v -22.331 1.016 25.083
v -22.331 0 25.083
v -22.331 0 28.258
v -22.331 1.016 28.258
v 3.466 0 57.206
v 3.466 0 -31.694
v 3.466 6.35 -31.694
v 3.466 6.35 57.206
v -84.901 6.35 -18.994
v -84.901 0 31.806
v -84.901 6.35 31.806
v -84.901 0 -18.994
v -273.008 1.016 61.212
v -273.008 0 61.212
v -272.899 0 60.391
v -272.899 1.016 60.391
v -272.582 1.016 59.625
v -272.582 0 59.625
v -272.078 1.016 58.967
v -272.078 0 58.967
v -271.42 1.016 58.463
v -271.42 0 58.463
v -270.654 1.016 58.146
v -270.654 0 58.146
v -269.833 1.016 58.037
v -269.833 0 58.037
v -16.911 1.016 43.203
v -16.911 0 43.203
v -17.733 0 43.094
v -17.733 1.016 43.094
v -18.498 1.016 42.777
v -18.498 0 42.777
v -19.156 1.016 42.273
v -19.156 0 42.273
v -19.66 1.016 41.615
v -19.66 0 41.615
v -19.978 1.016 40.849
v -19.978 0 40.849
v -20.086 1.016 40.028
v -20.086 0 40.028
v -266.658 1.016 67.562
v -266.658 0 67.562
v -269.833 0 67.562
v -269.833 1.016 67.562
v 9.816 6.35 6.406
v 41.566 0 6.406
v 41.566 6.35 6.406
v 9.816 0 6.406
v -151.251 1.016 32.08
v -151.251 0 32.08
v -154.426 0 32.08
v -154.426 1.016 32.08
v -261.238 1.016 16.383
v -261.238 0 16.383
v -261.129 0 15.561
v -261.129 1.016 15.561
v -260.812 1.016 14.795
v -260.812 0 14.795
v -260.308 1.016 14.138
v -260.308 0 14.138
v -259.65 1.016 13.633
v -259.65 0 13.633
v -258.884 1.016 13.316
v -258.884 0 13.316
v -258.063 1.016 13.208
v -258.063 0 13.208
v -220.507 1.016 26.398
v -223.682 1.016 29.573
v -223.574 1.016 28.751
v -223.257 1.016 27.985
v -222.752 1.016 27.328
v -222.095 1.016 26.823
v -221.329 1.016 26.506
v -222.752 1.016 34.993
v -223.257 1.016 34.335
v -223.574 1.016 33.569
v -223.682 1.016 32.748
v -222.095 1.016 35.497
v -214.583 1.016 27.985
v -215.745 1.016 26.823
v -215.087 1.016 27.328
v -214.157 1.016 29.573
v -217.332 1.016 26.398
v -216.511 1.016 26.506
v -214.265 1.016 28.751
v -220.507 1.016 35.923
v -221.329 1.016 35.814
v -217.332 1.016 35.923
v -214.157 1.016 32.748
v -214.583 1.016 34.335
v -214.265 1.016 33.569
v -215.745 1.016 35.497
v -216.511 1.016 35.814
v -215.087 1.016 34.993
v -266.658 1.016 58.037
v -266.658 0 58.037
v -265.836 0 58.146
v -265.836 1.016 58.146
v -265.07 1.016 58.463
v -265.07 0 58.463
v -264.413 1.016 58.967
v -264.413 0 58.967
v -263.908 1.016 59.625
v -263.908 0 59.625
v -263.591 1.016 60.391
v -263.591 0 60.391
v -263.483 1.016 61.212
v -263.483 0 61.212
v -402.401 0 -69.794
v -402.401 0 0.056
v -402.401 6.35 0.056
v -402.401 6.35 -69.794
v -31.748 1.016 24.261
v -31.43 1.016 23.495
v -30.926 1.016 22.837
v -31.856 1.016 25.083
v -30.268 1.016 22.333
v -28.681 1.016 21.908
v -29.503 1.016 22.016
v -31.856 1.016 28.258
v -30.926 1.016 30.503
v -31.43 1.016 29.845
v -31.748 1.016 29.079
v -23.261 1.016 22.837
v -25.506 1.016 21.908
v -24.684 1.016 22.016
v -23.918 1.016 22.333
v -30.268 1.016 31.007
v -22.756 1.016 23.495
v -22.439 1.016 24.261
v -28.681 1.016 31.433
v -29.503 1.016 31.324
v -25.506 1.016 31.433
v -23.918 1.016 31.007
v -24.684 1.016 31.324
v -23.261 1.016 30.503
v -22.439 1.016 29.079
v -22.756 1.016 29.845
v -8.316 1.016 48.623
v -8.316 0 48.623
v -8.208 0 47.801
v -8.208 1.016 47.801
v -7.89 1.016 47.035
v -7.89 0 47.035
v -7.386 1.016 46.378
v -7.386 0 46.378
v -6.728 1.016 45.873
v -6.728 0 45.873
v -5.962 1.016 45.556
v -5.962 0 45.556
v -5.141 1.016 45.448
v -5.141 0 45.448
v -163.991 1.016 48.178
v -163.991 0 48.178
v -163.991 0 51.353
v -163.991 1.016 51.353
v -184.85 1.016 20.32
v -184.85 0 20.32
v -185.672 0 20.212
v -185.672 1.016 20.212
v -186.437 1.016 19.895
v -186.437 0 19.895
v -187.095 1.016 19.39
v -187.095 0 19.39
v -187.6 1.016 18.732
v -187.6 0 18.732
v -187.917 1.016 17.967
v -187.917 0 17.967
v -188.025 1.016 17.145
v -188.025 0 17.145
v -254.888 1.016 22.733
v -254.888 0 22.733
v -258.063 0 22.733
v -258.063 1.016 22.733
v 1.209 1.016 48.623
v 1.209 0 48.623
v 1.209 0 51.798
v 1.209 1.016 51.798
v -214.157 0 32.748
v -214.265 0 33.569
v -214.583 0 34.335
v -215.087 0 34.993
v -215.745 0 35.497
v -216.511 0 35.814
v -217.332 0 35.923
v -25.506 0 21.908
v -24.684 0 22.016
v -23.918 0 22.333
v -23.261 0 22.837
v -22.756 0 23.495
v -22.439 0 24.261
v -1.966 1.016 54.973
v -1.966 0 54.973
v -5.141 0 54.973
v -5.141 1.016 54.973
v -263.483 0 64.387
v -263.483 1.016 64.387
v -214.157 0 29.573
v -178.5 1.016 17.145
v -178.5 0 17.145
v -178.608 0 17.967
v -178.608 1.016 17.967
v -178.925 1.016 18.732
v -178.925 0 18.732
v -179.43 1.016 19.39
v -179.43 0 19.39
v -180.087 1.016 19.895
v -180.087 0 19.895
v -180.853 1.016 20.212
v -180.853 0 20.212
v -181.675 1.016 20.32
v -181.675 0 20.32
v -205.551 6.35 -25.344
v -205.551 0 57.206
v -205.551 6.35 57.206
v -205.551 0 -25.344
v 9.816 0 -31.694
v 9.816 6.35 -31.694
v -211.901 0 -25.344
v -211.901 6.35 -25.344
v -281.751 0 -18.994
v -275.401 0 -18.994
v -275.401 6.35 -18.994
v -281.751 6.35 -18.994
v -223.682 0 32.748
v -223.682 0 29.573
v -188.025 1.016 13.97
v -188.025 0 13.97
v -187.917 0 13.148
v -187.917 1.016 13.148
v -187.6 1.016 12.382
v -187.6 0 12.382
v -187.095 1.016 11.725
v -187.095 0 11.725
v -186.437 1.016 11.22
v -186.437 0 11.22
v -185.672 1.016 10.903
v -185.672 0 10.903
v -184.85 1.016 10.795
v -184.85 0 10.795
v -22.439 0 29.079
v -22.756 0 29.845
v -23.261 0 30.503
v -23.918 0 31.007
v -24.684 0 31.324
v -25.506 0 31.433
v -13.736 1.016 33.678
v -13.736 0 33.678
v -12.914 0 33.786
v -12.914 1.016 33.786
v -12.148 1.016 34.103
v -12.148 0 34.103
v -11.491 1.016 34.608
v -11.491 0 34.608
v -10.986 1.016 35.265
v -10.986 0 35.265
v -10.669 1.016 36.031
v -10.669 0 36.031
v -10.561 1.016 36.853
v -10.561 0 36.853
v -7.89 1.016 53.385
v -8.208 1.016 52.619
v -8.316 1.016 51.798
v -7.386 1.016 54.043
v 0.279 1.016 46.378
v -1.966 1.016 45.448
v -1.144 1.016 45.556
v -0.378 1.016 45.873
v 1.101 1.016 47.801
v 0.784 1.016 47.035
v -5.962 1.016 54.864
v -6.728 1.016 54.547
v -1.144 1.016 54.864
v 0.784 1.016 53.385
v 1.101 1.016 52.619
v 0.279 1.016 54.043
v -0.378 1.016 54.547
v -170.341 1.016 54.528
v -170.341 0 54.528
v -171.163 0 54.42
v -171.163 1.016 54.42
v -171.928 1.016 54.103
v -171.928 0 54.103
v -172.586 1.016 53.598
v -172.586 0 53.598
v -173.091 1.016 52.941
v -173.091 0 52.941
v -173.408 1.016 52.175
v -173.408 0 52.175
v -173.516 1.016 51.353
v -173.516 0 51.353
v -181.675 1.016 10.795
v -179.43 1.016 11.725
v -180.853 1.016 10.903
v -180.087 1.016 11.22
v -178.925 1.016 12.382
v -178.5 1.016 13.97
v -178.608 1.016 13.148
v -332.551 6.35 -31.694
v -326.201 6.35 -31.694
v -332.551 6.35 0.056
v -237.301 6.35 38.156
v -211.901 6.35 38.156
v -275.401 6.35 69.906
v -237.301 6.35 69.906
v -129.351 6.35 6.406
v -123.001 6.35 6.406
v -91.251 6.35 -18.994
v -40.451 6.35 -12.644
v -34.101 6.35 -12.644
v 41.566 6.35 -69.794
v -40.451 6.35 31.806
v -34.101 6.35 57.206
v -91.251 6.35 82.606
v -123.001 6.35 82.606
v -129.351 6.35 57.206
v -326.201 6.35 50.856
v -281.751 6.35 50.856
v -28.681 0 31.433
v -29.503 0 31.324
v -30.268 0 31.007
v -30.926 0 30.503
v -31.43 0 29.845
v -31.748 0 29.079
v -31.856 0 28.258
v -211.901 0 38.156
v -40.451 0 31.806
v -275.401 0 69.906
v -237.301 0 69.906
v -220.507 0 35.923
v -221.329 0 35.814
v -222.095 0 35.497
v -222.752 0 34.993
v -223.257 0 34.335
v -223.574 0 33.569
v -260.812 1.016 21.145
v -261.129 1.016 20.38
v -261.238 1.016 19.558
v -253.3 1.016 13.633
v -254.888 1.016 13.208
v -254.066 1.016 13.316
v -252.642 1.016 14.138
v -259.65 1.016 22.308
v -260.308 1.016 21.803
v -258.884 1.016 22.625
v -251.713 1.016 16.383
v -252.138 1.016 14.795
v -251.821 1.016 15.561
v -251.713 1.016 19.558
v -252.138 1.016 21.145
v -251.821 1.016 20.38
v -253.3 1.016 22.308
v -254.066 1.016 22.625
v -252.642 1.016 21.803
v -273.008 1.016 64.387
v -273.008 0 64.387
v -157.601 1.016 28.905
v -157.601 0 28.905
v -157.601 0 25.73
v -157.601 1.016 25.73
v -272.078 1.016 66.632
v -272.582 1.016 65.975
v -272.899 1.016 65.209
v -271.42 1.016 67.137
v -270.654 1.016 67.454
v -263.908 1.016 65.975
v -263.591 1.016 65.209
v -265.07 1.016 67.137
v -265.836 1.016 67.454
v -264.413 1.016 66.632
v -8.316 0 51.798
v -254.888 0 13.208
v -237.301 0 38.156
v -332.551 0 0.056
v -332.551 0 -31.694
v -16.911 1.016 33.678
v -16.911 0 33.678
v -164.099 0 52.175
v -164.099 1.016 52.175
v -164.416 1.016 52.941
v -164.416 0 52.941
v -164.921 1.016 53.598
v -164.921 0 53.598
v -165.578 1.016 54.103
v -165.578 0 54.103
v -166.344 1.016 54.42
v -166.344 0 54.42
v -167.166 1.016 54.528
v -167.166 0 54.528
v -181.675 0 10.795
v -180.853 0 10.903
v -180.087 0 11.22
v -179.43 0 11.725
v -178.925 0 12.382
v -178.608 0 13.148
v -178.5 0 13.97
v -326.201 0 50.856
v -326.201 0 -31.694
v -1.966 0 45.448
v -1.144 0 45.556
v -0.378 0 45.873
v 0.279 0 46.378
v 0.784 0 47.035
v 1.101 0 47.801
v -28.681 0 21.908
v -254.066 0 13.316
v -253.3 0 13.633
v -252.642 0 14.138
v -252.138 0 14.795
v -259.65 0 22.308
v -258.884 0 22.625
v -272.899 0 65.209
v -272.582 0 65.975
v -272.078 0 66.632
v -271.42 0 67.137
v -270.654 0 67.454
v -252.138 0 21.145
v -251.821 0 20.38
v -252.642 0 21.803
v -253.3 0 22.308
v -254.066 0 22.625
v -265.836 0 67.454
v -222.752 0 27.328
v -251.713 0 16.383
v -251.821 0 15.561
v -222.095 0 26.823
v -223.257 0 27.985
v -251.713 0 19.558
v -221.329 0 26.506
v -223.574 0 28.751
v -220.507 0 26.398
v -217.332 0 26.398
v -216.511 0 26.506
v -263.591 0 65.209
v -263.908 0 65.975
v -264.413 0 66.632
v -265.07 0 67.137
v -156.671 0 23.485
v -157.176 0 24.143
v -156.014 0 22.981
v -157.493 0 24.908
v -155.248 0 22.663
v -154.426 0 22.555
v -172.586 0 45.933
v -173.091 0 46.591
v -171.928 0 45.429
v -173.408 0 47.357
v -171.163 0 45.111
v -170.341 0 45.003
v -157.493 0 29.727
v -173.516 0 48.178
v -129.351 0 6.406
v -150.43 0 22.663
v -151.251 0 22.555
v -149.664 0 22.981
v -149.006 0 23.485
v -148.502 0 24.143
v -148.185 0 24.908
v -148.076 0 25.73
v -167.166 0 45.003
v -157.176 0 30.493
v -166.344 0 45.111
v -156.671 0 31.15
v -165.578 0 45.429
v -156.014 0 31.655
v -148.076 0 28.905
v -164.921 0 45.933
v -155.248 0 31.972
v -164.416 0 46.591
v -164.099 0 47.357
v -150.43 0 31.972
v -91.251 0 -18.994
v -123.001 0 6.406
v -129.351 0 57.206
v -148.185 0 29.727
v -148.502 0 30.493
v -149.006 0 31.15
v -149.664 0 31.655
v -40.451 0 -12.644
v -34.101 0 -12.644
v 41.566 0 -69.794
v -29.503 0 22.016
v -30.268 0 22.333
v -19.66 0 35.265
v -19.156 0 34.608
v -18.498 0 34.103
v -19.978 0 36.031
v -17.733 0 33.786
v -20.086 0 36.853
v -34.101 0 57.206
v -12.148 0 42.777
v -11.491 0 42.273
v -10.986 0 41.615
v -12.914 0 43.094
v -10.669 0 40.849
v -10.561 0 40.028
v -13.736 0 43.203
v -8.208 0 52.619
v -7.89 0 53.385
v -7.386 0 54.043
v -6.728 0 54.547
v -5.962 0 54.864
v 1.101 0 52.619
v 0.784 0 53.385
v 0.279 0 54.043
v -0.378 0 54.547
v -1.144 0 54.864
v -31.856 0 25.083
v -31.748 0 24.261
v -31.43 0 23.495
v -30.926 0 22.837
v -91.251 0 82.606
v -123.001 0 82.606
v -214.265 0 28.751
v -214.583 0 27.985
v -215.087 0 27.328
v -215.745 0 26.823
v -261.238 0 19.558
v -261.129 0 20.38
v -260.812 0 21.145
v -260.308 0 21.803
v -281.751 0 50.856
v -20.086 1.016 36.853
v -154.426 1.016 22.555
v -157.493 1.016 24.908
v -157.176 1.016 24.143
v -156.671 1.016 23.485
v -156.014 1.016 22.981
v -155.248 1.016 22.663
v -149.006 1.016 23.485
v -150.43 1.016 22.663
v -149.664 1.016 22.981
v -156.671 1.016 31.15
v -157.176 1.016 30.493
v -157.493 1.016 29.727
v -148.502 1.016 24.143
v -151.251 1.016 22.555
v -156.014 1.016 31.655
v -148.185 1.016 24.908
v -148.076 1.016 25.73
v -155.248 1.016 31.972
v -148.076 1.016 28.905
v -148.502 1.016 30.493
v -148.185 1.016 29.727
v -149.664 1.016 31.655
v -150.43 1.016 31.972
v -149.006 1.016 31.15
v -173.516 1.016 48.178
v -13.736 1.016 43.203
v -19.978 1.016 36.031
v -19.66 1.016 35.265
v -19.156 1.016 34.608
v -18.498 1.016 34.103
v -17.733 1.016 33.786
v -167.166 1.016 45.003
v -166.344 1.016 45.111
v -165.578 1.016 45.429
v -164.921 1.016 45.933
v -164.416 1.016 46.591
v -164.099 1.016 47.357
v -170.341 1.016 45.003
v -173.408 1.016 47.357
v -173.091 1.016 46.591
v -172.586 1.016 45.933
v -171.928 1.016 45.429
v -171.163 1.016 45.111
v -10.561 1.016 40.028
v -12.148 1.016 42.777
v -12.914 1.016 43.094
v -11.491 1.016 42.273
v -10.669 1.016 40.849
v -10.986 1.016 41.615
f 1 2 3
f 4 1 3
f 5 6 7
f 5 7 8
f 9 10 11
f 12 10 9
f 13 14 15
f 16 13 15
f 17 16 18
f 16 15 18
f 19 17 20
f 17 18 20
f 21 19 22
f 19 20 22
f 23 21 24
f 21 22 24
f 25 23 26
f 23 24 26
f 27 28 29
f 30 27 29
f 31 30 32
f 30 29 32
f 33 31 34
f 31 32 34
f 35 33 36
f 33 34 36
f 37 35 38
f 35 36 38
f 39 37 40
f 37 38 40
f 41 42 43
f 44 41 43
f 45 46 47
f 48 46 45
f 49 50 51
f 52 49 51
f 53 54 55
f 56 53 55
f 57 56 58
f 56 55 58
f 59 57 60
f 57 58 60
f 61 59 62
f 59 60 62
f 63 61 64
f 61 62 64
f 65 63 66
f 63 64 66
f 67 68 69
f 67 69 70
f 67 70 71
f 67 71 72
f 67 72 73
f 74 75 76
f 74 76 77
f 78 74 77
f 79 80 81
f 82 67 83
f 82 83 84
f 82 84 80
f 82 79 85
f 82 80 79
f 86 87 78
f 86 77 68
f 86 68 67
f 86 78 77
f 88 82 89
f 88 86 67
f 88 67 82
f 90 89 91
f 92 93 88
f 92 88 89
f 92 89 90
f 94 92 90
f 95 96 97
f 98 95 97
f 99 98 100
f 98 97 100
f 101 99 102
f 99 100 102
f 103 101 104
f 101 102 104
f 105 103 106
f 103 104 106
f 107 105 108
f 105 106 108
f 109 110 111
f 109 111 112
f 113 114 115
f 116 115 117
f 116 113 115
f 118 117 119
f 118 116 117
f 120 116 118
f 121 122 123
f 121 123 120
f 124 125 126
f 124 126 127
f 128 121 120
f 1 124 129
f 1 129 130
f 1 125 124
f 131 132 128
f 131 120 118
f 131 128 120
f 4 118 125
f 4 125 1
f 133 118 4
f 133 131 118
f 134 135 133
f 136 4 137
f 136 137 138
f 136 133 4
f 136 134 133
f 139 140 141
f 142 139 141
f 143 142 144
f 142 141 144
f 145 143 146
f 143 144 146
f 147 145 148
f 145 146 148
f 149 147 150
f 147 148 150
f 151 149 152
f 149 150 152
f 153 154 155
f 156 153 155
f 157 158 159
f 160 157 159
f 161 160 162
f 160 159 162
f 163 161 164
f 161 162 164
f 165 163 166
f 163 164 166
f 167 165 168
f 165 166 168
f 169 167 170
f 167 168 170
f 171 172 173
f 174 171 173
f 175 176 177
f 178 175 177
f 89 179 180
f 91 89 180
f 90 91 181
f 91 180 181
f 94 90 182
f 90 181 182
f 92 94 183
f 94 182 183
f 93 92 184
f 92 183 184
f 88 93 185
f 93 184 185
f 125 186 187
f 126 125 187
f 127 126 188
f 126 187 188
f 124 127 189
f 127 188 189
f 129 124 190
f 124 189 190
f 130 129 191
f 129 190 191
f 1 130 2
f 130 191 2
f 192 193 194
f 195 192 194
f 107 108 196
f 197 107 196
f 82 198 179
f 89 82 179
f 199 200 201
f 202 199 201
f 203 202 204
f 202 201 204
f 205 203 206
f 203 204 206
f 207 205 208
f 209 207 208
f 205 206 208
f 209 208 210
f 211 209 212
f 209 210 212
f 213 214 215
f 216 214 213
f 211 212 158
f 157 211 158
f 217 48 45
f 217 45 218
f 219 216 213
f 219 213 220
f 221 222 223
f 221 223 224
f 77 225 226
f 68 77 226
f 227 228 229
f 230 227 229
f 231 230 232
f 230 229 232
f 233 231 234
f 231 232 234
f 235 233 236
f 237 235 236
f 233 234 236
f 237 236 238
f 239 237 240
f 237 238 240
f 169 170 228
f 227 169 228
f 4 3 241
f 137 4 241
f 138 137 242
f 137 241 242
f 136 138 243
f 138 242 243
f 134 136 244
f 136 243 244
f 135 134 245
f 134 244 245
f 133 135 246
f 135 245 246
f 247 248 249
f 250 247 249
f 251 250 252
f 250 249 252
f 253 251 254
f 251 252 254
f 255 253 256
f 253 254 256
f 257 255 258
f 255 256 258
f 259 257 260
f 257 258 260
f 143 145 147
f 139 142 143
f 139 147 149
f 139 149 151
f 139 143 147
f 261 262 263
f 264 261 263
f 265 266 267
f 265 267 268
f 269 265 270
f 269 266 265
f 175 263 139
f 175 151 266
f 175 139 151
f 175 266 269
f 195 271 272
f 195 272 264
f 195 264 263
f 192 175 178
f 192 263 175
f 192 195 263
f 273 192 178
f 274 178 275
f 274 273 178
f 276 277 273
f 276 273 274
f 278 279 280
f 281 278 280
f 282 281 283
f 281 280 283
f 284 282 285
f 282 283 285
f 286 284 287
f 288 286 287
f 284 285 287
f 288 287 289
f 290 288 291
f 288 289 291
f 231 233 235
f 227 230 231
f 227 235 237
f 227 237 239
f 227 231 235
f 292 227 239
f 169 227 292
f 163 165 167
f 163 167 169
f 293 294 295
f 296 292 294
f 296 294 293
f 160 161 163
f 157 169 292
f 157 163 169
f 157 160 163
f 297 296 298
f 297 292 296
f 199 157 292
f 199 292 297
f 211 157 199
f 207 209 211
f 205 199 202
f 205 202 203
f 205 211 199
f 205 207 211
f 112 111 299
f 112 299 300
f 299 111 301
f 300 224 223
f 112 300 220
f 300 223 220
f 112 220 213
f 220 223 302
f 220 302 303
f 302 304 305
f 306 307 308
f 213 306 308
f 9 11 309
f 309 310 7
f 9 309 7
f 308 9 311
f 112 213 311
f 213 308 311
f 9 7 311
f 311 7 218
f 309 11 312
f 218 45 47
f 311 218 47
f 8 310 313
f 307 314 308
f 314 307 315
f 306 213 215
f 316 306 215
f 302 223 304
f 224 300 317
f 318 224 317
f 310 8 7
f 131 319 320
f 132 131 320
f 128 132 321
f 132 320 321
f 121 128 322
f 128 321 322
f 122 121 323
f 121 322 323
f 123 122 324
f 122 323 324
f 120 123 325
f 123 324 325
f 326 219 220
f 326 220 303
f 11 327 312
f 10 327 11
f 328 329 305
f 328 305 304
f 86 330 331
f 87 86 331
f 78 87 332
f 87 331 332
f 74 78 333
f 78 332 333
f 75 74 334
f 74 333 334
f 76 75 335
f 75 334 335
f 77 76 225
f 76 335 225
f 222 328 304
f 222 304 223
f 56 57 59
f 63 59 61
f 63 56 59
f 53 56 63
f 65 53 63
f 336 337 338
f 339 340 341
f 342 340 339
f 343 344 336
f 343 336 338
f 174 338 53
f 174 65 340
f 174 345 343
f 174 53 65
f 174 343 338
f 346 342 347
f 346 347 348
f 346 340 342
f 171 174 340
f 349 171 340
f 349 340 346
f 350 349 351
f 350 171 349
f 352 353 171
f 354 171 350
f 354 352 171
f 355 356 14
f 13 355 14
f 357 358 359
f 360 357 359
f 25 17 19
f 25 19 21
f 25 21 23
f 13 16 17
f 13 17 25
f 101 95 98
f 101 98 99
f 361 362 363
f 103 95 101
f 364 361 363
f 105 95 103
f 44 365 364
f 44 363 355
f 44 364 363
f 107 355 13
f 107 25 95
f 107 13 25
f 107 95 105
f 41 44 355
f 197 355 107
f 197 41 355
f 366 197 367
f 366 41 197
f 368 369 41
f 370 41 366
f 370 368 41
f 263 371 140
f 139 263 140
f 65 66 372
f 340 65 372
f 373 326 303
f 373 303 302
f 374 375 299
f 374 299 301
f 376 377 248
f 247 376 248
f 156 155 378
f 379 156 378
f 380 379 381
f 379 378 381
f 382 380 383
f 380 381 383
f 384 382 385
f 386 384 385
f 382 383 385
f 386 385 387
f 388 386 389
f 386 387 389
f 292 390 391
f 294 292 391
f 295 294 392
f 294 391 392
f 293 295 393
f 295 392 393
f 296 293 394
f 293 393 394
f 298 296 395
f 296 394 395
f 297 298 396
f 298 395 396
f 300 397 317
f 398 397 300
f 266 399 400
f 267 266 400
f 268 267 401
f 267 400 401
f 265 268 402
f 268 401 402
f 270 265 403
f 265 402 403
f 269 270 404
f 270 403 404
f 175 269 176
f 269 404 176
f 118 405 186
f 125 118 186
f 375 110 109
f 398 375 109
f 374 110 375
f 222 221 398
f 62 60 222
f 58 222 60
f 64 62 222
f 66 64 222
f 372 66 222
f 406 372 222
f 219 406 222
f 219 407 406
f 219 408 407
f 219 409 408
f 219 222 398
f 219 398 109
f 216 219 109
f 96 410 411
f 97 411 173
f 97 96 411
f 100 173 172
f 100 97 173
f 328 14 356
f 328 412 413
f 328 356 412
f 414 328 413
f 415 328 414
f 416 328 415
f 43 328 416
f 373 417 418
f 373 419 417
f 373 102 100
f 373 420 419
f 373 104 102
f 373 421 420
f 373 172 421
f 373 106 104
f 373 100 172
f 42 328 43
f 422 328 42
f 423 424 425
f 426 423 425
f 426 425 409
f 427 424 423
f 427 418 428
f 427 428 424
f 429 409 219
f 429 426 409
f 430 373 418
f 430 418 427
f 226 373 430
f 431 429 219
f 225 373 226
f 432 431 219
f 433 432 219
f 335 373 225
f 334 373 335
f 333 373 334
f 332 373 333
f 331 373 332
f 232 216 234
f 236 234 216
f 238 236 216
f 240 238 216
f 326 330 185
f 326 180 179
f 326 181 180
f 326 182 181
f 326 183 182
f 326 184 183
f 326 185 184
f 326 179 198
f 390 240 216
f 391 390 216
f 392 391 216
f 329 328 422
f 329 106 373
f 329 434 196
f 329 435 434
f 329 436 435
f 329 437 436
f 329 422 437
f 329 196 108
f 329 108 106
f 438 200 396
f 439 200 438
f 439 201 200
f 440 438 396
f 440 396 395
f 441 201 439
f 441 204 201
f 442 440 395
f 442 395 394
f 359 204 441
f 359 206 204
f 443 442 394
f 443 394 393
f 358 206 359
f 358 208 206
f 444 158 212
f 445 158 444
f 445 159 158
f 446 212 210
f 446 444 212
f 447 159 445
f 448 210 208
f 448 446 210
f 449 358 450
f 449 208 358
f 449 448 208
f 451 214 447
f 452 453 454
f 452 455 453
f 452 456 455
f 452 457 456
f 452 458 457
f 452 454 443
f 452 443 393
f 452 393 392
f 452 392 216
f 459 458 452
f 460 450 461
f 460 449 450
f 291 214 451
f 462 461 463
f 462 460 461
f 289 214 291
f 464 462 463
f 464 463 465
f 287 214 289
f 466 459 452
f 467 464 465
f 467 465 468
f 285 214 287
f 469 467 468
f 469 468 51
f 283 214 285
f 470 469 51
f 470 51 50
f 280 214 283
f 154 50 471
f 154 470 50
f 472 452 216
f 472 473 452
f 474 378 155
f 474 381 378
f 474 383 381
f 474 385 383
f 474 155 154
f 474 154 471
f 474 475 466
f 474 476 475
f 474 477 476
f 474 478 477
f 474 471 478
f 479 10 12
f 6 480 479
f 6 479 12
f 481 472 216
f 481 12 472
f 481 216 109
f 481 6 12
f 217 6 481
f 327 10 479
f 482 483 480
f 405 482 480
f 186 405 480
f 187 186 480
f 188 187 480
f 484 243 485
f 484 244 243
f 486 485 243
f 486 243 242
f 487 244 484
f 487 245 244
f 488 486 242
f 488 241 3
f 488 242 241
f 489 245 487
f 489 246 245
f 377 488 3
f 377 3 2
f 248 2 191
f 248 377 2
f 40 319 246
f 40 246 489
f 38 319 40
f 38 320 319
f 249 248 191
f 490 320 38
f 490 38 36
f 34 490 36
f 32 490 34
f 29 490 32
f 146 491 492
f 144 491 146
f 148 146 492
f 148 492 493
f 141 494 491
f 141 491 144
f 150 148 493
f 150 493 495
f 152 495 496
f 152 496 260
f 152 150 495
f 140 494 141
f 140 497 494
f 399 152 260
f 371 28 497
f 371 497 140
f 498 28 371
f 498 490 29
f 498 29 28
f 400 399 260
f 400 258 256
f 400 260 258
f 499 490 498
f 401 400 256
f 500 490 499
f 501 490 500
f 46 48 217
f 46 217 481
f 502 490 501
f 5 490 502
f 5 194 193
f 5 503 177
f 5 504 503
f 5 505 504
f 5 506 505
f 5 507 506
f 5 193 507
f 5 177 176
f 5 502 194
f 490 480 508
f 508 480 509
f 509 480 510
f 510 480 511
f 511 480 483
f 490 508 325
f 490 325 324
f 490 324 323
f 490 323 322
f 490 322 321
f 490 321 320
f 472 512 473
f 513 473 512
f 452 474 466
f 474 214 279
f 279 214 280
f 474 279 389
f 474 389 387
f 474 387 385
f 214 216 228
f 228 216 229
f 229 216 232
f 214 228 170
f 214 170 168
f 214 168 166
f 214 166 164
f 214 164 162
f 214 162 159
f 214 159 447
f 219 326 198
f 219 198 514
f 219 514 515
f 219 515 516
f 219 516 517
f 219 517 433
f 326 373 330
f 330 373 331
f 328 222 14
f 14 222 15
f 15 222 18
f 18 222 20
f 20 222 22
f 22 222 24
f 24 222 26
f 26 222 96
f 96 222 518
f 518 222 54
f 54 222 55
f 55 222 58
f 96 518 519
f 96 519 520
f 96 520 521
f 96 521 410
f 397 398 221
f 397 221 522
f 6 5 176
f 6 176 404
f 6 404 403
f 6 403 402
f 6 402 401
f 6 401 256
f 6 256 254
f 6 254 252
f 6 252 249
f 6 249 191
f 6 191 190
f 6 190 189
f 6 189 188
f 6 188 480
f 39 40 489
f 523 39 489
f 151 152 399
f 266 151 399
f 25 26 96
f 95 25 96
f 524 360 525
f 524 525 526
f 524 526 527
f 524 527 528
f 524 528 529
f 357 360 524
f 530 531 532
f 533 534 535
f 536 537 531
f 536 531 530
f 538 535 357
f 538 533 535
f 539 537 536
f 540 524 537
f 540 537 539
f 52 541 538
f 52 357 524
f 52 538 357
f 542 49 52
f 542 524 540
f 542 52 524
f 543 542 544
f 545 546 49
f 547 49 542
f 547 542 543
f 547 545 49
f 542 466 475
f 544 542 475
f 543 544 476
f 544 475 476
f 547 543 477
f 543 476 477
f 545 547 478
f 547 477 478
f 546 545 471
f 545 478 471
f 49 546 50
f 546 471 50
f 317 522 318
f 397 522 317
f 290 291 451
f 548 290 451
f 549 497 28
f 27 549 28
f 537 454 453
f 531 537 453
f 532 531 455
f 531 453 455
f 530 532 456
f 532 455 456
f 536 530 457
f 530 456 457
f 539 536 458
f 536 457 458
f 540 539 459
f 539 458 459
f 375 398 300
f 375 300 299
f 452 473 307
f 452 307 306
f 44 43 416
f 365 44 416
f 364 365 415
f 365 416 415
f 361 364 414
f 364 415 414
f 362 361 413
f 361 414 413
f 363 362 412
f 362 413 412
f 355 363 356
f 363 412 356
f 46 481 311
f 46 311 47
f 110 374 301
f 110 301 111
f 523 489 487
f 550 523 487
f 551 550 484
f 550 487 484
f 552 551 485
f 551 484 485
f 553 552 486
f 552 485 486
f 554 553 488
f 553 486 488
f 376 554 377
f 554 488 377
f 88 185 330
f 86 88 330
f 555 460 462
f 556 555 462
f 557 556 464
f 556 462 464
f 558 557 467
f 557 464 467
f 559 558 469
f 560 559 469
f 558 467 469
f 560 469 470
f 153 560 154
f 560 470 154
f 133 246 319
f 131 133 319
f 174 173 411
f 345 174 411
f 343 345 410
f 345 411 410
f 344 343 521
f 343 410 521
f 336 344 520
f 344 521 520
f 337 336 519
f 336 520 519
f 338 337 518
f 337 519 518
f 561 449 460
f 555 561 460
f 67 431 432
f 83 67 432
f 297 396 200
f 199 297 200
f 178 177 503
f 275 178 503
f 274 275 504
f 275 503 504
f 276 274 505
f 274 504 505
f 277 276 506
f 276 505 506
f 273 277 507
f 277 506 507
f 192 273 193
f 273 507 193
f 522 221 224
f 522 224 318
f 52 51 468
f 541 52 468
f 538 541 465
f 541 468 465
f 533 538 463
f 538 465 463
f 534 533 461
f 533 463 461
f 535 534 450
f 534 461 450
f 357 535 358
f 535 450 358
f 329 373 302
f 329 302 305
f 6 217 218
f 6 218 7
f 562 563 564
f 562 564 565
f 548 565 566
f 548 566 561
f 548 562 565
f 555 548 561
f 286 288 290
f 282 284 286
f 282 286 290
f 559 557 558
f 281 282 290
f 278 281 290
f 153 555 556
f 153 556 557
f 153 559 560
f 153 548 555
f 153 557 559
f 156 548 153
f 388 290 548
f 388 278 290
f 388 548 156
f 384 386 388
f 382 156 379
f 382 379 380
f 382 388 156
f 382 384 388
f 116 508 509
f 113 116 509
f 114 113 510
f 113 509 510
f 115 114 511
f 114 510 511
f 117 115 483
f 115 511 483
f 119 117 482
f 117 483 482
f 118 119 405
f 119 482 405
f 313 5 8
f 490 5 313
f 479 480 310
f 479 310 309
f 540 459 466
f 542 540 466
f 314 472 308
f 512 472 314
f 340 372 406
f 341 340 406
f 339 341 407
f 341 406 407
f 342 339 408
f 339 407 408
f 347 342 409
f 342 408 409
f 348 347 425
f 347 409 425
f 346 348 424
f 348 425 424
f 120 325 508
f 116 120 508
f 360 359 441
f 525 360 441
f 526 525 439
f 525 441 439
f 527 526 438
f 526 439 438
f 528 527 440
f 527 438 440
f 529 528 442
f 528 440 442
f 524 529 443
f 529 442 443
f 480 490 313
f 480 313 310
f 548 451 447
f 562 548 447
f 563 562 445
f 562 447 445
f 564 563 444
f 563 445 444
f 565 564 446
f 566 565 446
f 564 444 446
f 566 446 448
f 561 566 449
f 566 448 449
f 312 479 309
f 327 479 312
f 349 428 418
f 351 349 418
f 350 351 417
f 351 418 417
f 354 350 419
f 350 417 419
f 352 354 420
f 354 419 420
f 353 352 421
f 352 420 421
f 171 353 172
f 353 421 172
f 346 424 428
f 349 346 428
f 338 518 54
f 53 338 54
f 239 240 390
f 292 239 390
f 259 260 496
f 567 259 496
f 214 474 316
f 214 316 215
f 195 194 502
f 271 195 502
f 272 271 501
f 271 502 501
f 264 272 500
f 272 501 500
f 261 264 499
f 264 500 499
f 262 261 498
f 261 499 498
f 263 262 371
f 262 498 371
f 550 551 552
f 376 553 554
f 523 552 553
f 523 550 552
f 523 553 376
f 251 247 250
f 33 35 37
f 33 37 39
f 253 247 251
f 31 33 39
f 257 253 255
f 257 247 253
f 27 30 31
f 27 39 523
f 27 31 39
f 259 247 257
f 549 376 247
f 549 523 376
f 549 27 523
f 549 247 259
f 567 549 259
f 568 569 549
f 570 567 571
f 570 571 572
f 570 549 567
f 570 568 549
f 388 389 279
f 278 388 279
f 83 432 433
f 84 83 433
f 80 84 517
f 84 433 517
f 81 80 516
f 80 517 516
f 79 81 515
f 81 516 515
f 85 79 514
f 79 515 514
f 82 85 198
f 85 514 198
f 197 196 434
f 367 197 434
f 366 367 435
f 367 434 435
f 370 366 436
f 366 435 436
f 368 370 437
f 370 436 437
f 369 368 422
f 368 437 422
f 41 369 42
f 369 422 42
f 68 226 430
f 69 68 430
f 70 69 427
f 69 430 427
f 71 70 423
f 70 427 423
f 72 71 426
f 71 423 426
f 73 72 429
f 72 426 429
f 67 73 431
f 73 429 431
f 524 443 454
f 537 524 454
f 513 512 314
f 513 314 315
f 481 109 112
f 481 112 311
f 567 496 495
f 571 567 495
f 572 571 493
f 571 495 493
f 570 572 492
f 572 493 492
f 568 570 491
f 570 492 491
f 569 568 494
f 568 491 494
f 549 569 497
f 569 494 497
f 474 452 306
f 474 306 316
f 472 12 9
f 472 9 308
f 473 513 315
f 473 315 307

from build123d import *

# Parameters (mm, degrees)
F1_DEPTH = 6.35
F2_DEPTH = 1.016


with BuildPart() as f1:
    # F0 (on Front) → F1 (new body)
    with BuildSketch(Plane.XZ):
        Polygon((3.4657023708, 19.6624366212), (3.4657023708, 57.2062912531), (-34.1008976292, 57.2062912531), (-34.1008976292, 19.6624366212), (-34.1008976292, -12.6437214131), (-40.4508976292, -12.6437214131), (-40.4508976292, 31.8062785869), (-84.9008976292, 31.8062785869), (-84.9008976292, 17.7545957267), (-84.9008976292, -18.9937214131), (-91.2508976292, -18.9937214131), (-91.2508976292, 82.6062785869), (-123.0008976292, 82.6062785869), (-123.0008976292, 6.4062785869), (-129.3508976292, 6.4062785869), (-129.3508976292, 57.2062785869), (-205.5508976292, 57.2062785869), (-205.5508976292, -25.3437214131), (-211.9008976292, -25.3437214131), (-211.9008976292, 38.1562785869), (-237.3008976292, 38.1562785869), (-237.3008976292, 69.9062785869), (-275.4008976292, 69.9062785869), (-275.4008976292, -18.9937214131), (-281.7508976292, -18.9937214131), (-281.7508976292, 50.8562785869), (-326.2008976292, 50.8562785869), (-326.2008976292, -31.6937214131), (-332.5508976292, -31.6937214131), (-332.5508976292, 0.0562785869), (-402.4008976292, 0.0562785869), (-402.4008976292, -69.7937214131), (-332.5508976292, -69.7937214131), (-326.2008976292, -69.7937214131), (-281.7508976292, -69.7937214131), (-275.4008976292, -69.7937214131), (-237.3008976292, -69.7937214131), (-211.9008976292, -69.7937214131), (-205.5508976292, -69.7937214131), (-129.3508976292, -69.7937214131), (-123.0008976292, -69.7937214131), (-91.2508976292, -69.7937214131), (-84.9008976292, -69.7937214131), (-40.4508976292, -69.7937214131), (-34.1008976292, -69.7937214131), (3.4657023708, -69.7937214131), (9.8157023708, -69.7937214131), (41.5657023708, -69.7937214131), (41.5657023708, 6.4062785869), (9.8157023708, 6.4062785869), (9.8157023708, -31.6937214131), (3.4657023708, -31.6937214131), (3.4657023708, 19.651035132), align=None)
        with BuildLine():
            ThreePointArc((-258.0625617027, 13.2079981267), (-260.307625733, 14.1379340965), (-261.2375617027, 16.3829981267))
            Line((-261.2375617027, 16.3829981267), (-261.2375617027, 19.5579981267))
            ThreePointArc((-261.2375617027, 19.5579981267), (-260.307625733, 21.803062157), (-258.0625617027, 22.7329981267))
            Line((-258.0625617027, 22.7329981267), (-254.8875617027, 22.7329981267))
            ThreePointArc((-254.8875617027, 22.7329981267), (-252.6424976725, 21.803062157), (-251.7125617027, 19.5579981267))
            Line((-251.7125617027, 19.5579981267), (-251.7125617027, 16.3829981267))
            ThreePointArc((-251.7125617027, 16.3829981267), (-252.6424976725, 14.1379340965), (-254.8875617027, 13.2079981267))
            Line((-254.8875617027, 13.2079981267), (-258.0625617027, 13.2079981267))
        make_face(mode=Mode.SUBTRACT)
        with BuildLine():
            ThreePointArc((-188.0249530077, 17.1449978754), (-187.095017038, 19.3900619057), (-184.8499530077, 20.3199978754))
            Line((-184.8499530077, 20.3199978754), (-181.6749530077, 20.3199978754))
            ThreePointArc((-181.6749530077, 20.3199978754), (-179.4298889774, 19.3900619057), (-178.4999530077, 17.1449978754))
            Line((-178.4999530077, 17.1449978754), (-178.4999530077, 13.9699978754))
            ThreePointArc((-178.4999530077, 13.9699978754), (-179.4298889774, 11.7249338451), (-181.6749530077, 10.7949978754))
            Line((-181.6749530077, 10.7949978754), (-184.8499530077, 10.7949978754))
            ThreePointArc((-184.8499530077, 10.7949978754), (-187.095017038, 11.7249338451), (-188.0249530077, 13.9699978754))
            Line((-188.0249530077, 13.9699978754), (-188.0249530077, 17.1449978754))
        make_face(mode=Mode.SUBTRACT)
        with BuildLine():
            ThreePointArc((-223.6823077685, 32.7475722294), (-222.7523717988, 34.9926362596), (-220.5073077685, 35.9225722294))
            Line((-220.5073077685, 35.9225722294), (-217.3323077685, 35.9225722294))
            ThreePointArc((-217.3323077685, 35.9225722294), (-215.0872437382, 34.9926362596), (-214.1573077685, 32.7475722294))
            Line((-214.1573077685, 32.7475722294), (-214.1573077685, 29.5725722294))
            ThreePointArc((-214.1573077685, 29.5725722294), (-215.0872437382, 27.3275081991), (-217.3323077685, 26.3975722294))
            Line((-217.3323077685, 26.3975722294), (-220.5073077685, 26.3975722294))
            ThreePointArc((-220.5073077685, 26.3975722294), (-222.7523717988, 27.3275081991), (-223.6823077685, 29.5725722294))
            Line((-223.6823077685, 29.5725722294), (-223.6823077685, 32.7475722294))
        make_face(mode=Mode.SUBTRACT)
        with BuildLine():
            ThreePointArc((-269.8326279198, 58.0373540644), (-272.0776919501, 58.9672900342), (-273.0076279198, 61.2123540644))
            Line((-273.0076279198, 61.2123540644), (-273.0076279198, 64.3873540644))
            ThreePointArc((-273.0076279198, 64.3873540644), (-272.0776919501, 66.6324180947), (-269.8326279198, 67.5623540644))
            Line((-269.8326279198, 67.5623540644), (-266.6576279198, 67.5623540644))
            ThreePointArc((-266.6576279198, 67.5623540644), (-264.4125638896, 66.6324180947), (-263.4826279198, 64.3873540644))
            Line((-263.4826279198, 64.3873540644), (-263.4826279198, 61.2123540644))
            ThreePointArc((-263.4826279198, 61.2123540644), (-264.4125638896, 58.9672900342), (-266.6576279198, 58.0373540644))
            Line((-266.6576279198, 58.0373540644), (-269.8326279198, 58.0373540644))
        make_face(mode=Mode.SUBTRACT)
        with BuildLine():
            Line((-148.0764249472, 20.3199978754), (-181.6749530077, 20.3199978754))
            Line((-181.6749530077, 20.3199978754), (-181.6749530077, 22.5551978754))
            Line((-181.6749530077, 22.5551978754), (-154.4264242679, 22.5551978754))
            ThreePointArc((-154.4264242679, 22.5551978754), (-156.6714882982, 23.4851338451), (-157.6014242679, 25.7301978754))
            Line((-157.6014242679, 25.7301978754), (-157.6014242679, 28.9051978754))
            ThreePointArc((-157.6014242679, 28.9051978754), (-156.6714882982, 31.1502619057), (-154.4264242679, 32.0801978754))
            Line((-154.4264242679, 32.0801978754), (-151.2514242679, 32.0801978754))
            ThreePointArc((-151.2514242679, 32.0801978754), (-149.0063602376, 31.1502619057), (-148.0764242679, 28.9051978754))
            Line((-148.0764242679, 28.9051978754), (-148.0764242679, 25.7301978754))
            ThreePointArc((-148.0764242679, 25.7301978754), (-149.0063602376, 23.4851338451), (-151.2514242679, 22.5551978754))
            Line((-151.2514242679, 22.5551978754), (-148.0764249472, 22.5551978754))
            Line((-148.0764249472, 22.5551978754), (-148.0764249472, 20.3199978754))
        make_face(mode=Mode.SUBTRACT)
        with BuildLine():
            ThreePointArc((-31.855833599, 28.2575006515), (-30.9258976292, 30.5025646817), (-28.680833599, 31.4325006515))
            Line((-28.680833599, 31.4325006515), (-25.505833599, 31.4325006515))
            ThreePointArc((-25.505833599, 31.4325006515), (-23.2607695687, 30.5025646817), (-22.330833599, 28.2575006515))
            Line((-22.330833599, 28.2575006515), (-22.330833599, 25.0825006515))
            ThreePointArc((-22.330833599, 25.0825006515), (-23.2607695687, 22.8374366212), (-25.505833599, 21.9075006515))
            Line((-25.505833599, 21.9075006515), (-28.680833599, 21.9075006515))
            ThreePointArc((-28.680833599, 21.9075006515), (-30.9258976292, 22.8374366212), (-31.855833599, 25.0825006515))
            Line((-31.855833599, 25.0825006515), (-31.855833599, 28.2575006515))
        make_face(mode=Mode.SUBTRACT)
        with BuildLine():
            ThreePointArc((-20.0857695687, 40.0275646817), (-19.155833599, 42.272628712), (-16.9107695687, 43.2025646817))
            Line((-16.9107695687, 43.2025646817), (-13.7357695687, 43.2025646817))
            ThreePointArc((-13.7357695687, 43.2025646817), (-11.4907055384, 42.272628712), (-10.5607695687, 40.0275646817))
            Line((-10.5607695687, 40.0275646817), (-10.5607695687, 36.8525646817))
            ThreePointArc((-10.5607695687, 36.8525646817), (-11.4907055384, 34.6075006515), (-13.7357695687, 33.6775646817))
            Line((-13.7357695687, 33.6775646817), (-16.9107695687, 33.6775646817))
            ThreePointArc((-16.9107695687, 33.6775646817), (-19.155833599, 34.6075006515), (-20.0857695687, 36.8525646817))
            Line((-20.0857695687, 36.8525646817), (-20.0857695687, 40.0275646817))
        make_face(mode=Mode.SUBTRACT)
        with BuildLine():
            ThreePointArc((-173.5159547505, 51.3532994753), (-172.5860187808, 53.5983635056), (-170.3409547505, 54.5282994753))
            Line((-170.3409547505, 54.5282994753), (-167.1659547505, 54.5282994753))
            ThreePointArc((-167.1659547505, 54.5282994753), (-164.9208907202, 53.5983635056), (-163.9909547505, 51.3532994753))
            Line((-163.9909547505, 51.3532994753), (-163.9909547505, 48.1782994753))
            ThreePointArc((-163.9909547505, 48.1782994753), (-164.9208907202, 45.933235445), (-167.1659547505, 45.0032994753))
            Line((-167.1659547505, 45.0032994753), (-170.3409547505, 45.0032994753))
            ThreePointArc((-170.3409547505, 45.0032994753), (-172.5860187808, 45.933235445), (-173.5159547505, 48.1782994753))
            Line((-173.5159547505, 48.1782994753), (-173.5159547505, 51.3532994753))
        make_face(mode=Mode.SUBTRACT)
        with BuildLine():
            ThreePointArc((-8.3157055384, 51.797628712), (-7.3857695687, 54.0426927423), (-5.1407055384, 54.972628712))
            Line((-5.1407055384, 54.972628712), (-1.9657055384, 54.972628712))
            ThreePointArc((-1.9657055384, 54.972628712), (0.2793584918, 54.0426927423), (1.2092944616, 51.797628712))
            Line((1.2092944616, 51.797628712), (1.2092944616, 48.622628712))
            ThreePointArc((1.2092944616, 48.622628712), (0.2793584918, 46.3775646817), (-1.9657055384, 45.447628712))
            Line((-1.9657055384, 45.447628712), (-5.1407055384, 45.447628712))
            ThreePointArc((-5.1407055384, 45.447628712), (-7.3857695687, 46.3775646817), (-8.3157055384, 48.622628712))
            Line((-8.3157055384, 48.622628712), (-8.3157055384, 51.797628712))
        make_face(mode=Mode.SUBTRACT)
        with BuildLine():
            Line((-273.0076279198, 64.3873540644), (-273.0076279198, 61.2123540644))
            ThreePointArc((-273.0076279198, 61.2123540644), (-272.0776919501, 58.9672900342), (-269.8326279198, 58.0373540644))
            Line((-269.8326279198, 58.0373540644), (-266.6576279198, 58.0373540644))
            ThreePointArc((-266.6576279198, 58.0373540644), (-264.4125638896, 58.9672900342), (-263.4826279198, 61.2123540644))
            Line((-263.4826279198, 61.2123540644), (-263.4826279198, 64.3873540644))
            ThreePointArc((-263.4826279198, 64.3873540644), (-264.4125638896, 66.6324180947), (-266.6576279198, 67.5623540644))
            Line((-266.6576279198, 67.5623540644), (-269.8326279198, 67.5623540644))
            ThreePointArc((-269.8326279198, 67.5623540644), (-272.0776919501, 66.6324180947), (-273.0076279198, 64.3873540644))
        make_face()
        with BuildLine():
            Line((-181.6749530077, 20.3199978754), (-184.8499530077, 20.3199978754))
            ThreePointArc((-184.8499530077, 20.3199978754), (-187.095017038, 19.3900619057), (-188.0249530077, 17.1449978754))
            Line((-188.0249530077, 17.1449978754), (-188.0249530077, 13.9699978754))
            ThreePointArc((-188.0249530077, 13.9699978754), (-187.095017038, 11.7249338451), (-184.8499530077, 10.7949978754))
            Line((-184.8499530077, 10.7949978754), (-181.6749530077, 10.7949978754))
            ThreePointArc((-181.6749530077, 10.7949978754), (-179.4298889774, 11.7249338451), (-178.4999530077, 13.9699978754))
            Line((-178.4999530077, 13.9699978754), (-178.4999530077, 17.1449978754))
            ThreePointArc((-178.4999530077, 17.1449978754), (-179.4298889774, 19.3900619057), (-181.6749530077, 20.3199978754))
        make_face()
        with BuildLine():
            Line((-25.505833599, 31.4325006515), (-28.680833599, 31.4325006515))
            ThreePointArc((-28.680833599, 31.4325006515), (-30.9258976292, 30.5025646817), (-31.855833599, 28.2575006515))
            Line((-31.855833599, 28.2575006515), (-31.855833599, 25.0825006515))
            ThreePointArc((-31.855833599, 25.0825006515), (-30.9258976292, 22.8374366212), (-28.680833599, 21.9075006515))
            Line((-28.680833599, 21.9075006515), (-25.505833599, 21.9075006515))
            ThreePointArc((-25.505833599, 21.9075006515), (-23.2607695687, 22.8374366212), (-22.330833599, 25.0825006515))
            Line((-22.330833599, 25.0825006515), (-22.330833599, 28.2575006515))
            ThreePointArc((-22.330833599, 28.2575006515), (-23.2607695687, 30.5025646817), (-25.505833599, 31.4325006515))
        make_face()
        with BuildLine():
            ThreePointArc((-157.6014242679, 25.7301978754), (-156.6714882982, 23.4851338451), (-154.4264242679, 22.5551978754))
            Line((-154.4264242679, 22.5551978754), (-151.2514242679, 22.5551978754))
            ThreePointArc((-151.2514242679, 22.5551978754), (-149.0063602376, 23.4851338451), (-148.0764242679, 25.7301978754))
            Line((-148.0764242679, 25.7301978754), (-148.0764242679, 28.9051978754))
            ThreePointArc((-148.0764242679, 28.9051978754), (-149.0063602376, 31.1502619057), (-151.2514242679, 32.0801978754))
            Line((-151.2514242679, 32.0801978754), (-154.4264242679, 32.0801978754))
            ThreePointArc((-154.4264242679, 32.0801978754), (-156.6714882982, 31.1502619057), (-157.6014242679, 28.9051978754))
            Line((-157.6014242679, 28.9051978754), (-157.6014242679, 25.7301978754))
        make_face()
        with BuildLine():
            Line((-13.7357695687, 43.2025646817), (-16.9107695687, 43.2025646817))
            ThreePointArc((-16.9107695687, 43.2025646817), (-19.155833599, 42.272628712), (-20.0857695687, 40.0275646817))
            Line((-20.0857695687, 40.0275646817), (-20.0857695687, 36.8525646817))
            ThreePointArc((-20.0857695687, 36.8525646817), (-19.155833599, 34.6075006515), (-16.9107695687, 33.6775646817))
            Line((-16.9107695687, 33.6775646817), (-13.7357695687, 33.6775646817))
            ThreePointArc((-13.7357695687, 33.6775646817), (-11.4907055384, 34.6075006515), (-10.5607695687, 36.8525646817))
            Line((-10.5607695687, 36.8525646817), (-10.5607695687, 40.0275646817))
            ThreePointArc((-10.5607695687, 40.0275646817), (-11.4907055384, 42.272628712), (-13.7357695687, 43.2025646817))
        make_face()
        with BuildLine():
            Line((-261.2375617027, 19.5579981267), (-261.2375617027, 16.3829981267))
            ThreePointArc((-261.2375617027, 16.3829981267), (-260.307625733, 14.1379340965), (-258.0625617027, 13.2079981267))
            Line((-258.0625617027, 13.2079981267), (-254.8875617027, 13.2079981267))
            ThreePointArc((-254.8875617027, 13.2079981267), (-252.6424976725, 14.1379340965), (-251.7125617027, 16.3829981267))
            Line((-251.7125617027, 16.3829981267), (-251.7125617027, 19.5579981267))
            ThreePointArc((-251.7125617027, 19.5579981267), (-252.6424976725, 21.803062157), (-254.8875617027, 22.7329981267))
            Line((-254.8875617027, 22.7329981267), (-258.0625617027, 22.7329981267))
            ThreePointArc((-258.0625617027, 22.7329981267), (-260.307625733, 21.803062157), (-261.2375617027, 19.5579981267))
        make_face()
        with BuildLine():
            Line((-167.1659547505, 54.5282994753), (-170.3409547505, 54.5282994753))
            ThreePointArc((-170.3409547505, 54.5282994753), (-172.5860187808, 53.5983635056), (-173.5159547505, 51.3532994753))
            Line((-173.5159547505, 51.3532994753), (-173.5159547505, 48.1782994753))
            ThreePointArc((-173.5159547505, 48.1782994753), (-172.5860187808, 45.933235445), (-170.3409547505, 45.0032994753))
            Line((-170.3409547505, 45.0032994753), (-167.1659547505, 45.0032994753))
            ThreePointArc((-167.1659547505, 45.0032994753), (-164.9208907202, 45.933235445), (-163.9909547505, 48.1782994753))
            Line((-163.9909547505, 48.1782994753), (-163.9909547505, 51.3532994753))
            ThreePointArc((-163.9909547505, 51.3532994753), (-164.9208907202, 53.5983635056), (-167.1659547505, 54.5282994753))
        make_face()
        with BuildLine():
            Line((-1.9657055384, 54.972628712), (-5.1407055384, 54.972628712))
            ThreePointArc((-5.1407055384, 54.972628712), (-7.3857695687, 54.0426927423), (-8.3157055384, 51.797628712))
            Line((-8.3157055384, 51.797628712), (-8.3157055384, 48.622628712))
            ThreePointArc((-8.3157055384, 48.622628712), (-7.3857695687, 46.3775646817), (-5.1407055384, 45.447628712))
            Line((-5.1407055384, 45.447628712), (-1.9657055384, 45.447628712))
            ThreePointArc((-1.9657055384, 45.447628712), (0.2793584918, 46.3775646817), (1.2092944616, 48.622628712))
            Line((1.2092944616, 48.622628712), (1.2092944616, 51.797628712))
            ThreePointArc((1.2092944616, 51.797628712), (0.2793584918, 54.0426927423), (-1.9657055384, 54.972628712))
        make_face()
        with BuildLine():
            Line((-217.3323077685, 35.9225722294), (-220.5073077685, 35.9225722294))
            ThreePointArc((-220.5073077685, 35.9225722294), (-222.7523717988, 34.9926362596), (-223.6823077685, 32.7475722294))
            Line((-223.6823077685, 32.7475722294), (-223.6823077685, 29.5725722294))
            ThreePointArc((-223.6823077685, 29.5725722294), (-222.7523717988, 27.3275081991), (-220.5073077685, 26.3975722294))
            Line((-220.5073077685, 26.3975722294), (-217.3323077685, 26.3975722294))
            ThreePointArc((-217.3323077685, 26.3975722294), (-215.0872437382, 27.3275081991), (-214.1573077685, 29.5725722294))
            Line((-214.1573077685, 29.5725722294), (-214.1573077685, 32.7475722294))
            ThreePointArc((-214.1573077685, 32.7475722294), (-215.0872437382, 34.9926362596), (-217.3323077685, 35.9225722294))
        make_face()
        Polygon((-181.6749530077, 22.5551978754), (-181.6749530077, 20.3199978754), (-148.0764249472, 20.3199978754), (-148.0764249472, 22.5551978754), (-151.2514242679, 22.5551978754), (-154.4264242679, 22.5551978754), align=None)
    extrude(amount=-F1_DEPTH)

    # F0 (on Front) → F2 (cut)
    with BuildSketch(Plane.XZ):
        with BuildLine():
            Line((-273.0076279198, 64.3873540644), (-273.0076279198, 61.2123540644))
            ThreePointArc((-273.0076279198, 61.2123540644), (-272.0776919501, 58.9672900342), (-269.8326279198, 58.0373540644))
            Line((-269.8326279198, 58.0373540644), (-266.6576279198, 58.0373540644))
            ThreePointArc((-266.6576279198, 58.0373540644), (-264.4125638896, 58.9672900342), (-263.4826279198, 61.2123540644))
            Line((-263.4826279198, 61.2123540644), (-263.4826279198, 64.3873540644))
            ThreePointArc((-263.4826279198, 64.3873540644), (-264.4125638896, 66.6324180947), (-266.6576279198, 67.5623540644))
            Line((-266.6576279198, 67.5623540644), (-269.8326279198, 67.5623540644))
            ThreePointArc((-269.8326279198, 67.5623540644), (-272.0776919501, 66.6324180947), (-273.0076279198, 64.3873540644))
        make_face()
        with BuildLine():
            Line((-261.2375617027, 19.5579981267), (-261.2375617027, 16.3829981267))
            ThreePointArc((-261.2375617027, 16.3829981267), (-260.307625733, 14.1379340965), (-258.0625617027, 13.2079981267))
            Line((-258.0625617027, 13.2079981267), (-254.8875617027, 13.2079981267))
            ThreePointArc((-254.8875617027, 13.2079981267), (-252.6424976725, 14.1379340965), (-251.7125617027, 16.3829981267))
            Line((-251.7125617027, 16.3829981267), (-251.7125617027, 19.5579981267))
            ThreePointArc((-251.7125617027, 19.5579981267), (-252.6424976725, 21.803062157), (-254.8875617027, 22.7329981267))
            Line((-254.8875617027, 22.7329981267), (-258.0625617027, 22.7329981267))
            ThreePointArc((-258.0625617027, 22.7329981267), (-260.307625733, 21.803062157), (-261.2375617027, 19.5579981267))
        make_face()
        with BuildLine():
            Line((-217.3323077685, 35.9225722294), (-220.5073077685, 35.9225722294))
            ThreePointArc((-220.5073077685, 35.9225722294), (-222.7523717988, 34.9926362596), (-223.6823077685, 32.7475722294))
            Line((-223.6823077685, 32.7475722294), (-223.6823077685, 29.5725722294))
            ThreePointArc((-223.6823077685, 29.5725722294), (-222.7523717988, 27.3275081991), (-220.5073077685, 26.3975722294))
            Line((-220.5073077685, 26.3975722294), (-217.3323077685, 26.3975722294))
            ThreePointArc((-217.3323077685, 26.3975722294), (-215.0872437382, 27.3275081991), (-214.1573077685, 29.5725722294))
            Line((-214.1573077685, 29.5725722294), (-214.1573077685, 32.7475722294))
            ThreePointArc((-214.1573077685, 32.7475722294), (-215.0872437382, 34.9926362596), (-217.3323077685, 35.9225722294))
        make_face()
        with BuildLine():
            Line((-167.1659547505, 54.5282994753), (-170.3409547505, 54.5282994753))
            ThreePointArc((-170.3409547505, 54.5282994753), (-172.5860187808, 53.5983635056), (-173.5159547505, 51.3532994753))
            Line((-173.5159547505, 51.3532994753), (-173.5159547505, 48.1782994753))
            ThreePointArc((-173.5159547505, 48.1782994753), (-172.5860187808, 45.933235445), (-170.3409547505, 45.0032994753))
            Line((-170.3409547505, 45.0032994753), (-167.1659547505, 45.0032994753))
            ThreePointArc((-167.1659547505, 45.0032994753), (-164.9208907202, 45.933235445), (-163.9909547505, 48.1782994753))
            Line((-163.9909547505, 48.1782994753), (-163.9909547505, 51.3532994753))
            ThreePointArc((-163.9909547505, 51.3532994753), (-164.9208907202, 53.5983635056), (-167.1659547505, 54.5282994753))
        make_face()
        with BuildLine():
            Line((-181.6749530077, 20.3199978754), (-184.8499530077, 20.3199978754))
            ThreePointArc((-184.8499530077, 20.3199978754), (-187.095017038, 19.3900619057), (-188.0249530077, 17.1449978754))
            Line((-188.0249530077, 17.1449978754), (-188.0249530077, 13.9699978754))
            ThreePointArc((-188.0249530077, 13.9699978754), (-187.095017038, 11.7249338451), (-184.8499530077, 10.7949978754))
            Line((-184.8499530077, 10.7949978754), (-181.6749530077, 10.7949978754))
            ThreePointArc((-181.6749530077, 10.7949978754), (-179.4298889774, 11.7249338451), (-178.4999530077, 13.9699978754))
            Line((-178.4999530077, 13.9699978754), (-178.4999530077, 17.1449978754))
            ThreePointArc((-178.4999530077, 17.1449978754), (-179.4298889774, 19.3900619057), (-181.6749530077, 20.3199978754))
        make_face()
        with BuildLine():
            ThreePointArc((-157.6014242679, 25.7301978754), (-156.6714882982, 23.4851338451), (-154.4264242679, 22.5551978754))
            Line((-154.4264242679, 22.5551978754), (-151.2514242679, 22.5551978754))
            ThreePointArc((-151.2514242679, 22.5551978754), (-149.0063602376, 23.4851338451), (-148.0764242679, 25.7301978754))
            Line((-148.0764242679, 25.7301978754), (-148.0764242679, 28.9051978754))
            ThreePointArc((-148.0764242679, 28.9051978754), (-149.0063602376, 31.1502619057), (-151.2514242679, 32.0801978754))
            Line((-151.2514242679, 32.0801978754), (-154.4264242679, 32.0801978754))
            ThreePointArc((-154.4264242679, 32.0801978754), (-156.6714882982, 31.1502619057), (-157.6014242679, 28.9051978754))
            Line((-157.6014242679, 28.9051978754), (-157.6014242679, 25.7301978754))
        make_face()
        with BuildLine():
            Line((-25.505833599, 31.4325006515), (-28.680833599, 31.4325006515))
            ThreePointArc((-28.680833599, 31.4325006515), (-30.9258976292, 30.5025646817), (-31.855833599, 28.2575006515))
            Line((-31.855833599, 28.2575006515), (-31.855833599, 25.0825006515))
            ThreePointArc((-31.855833599, 25.0825006515), (-30.9258976292, 22.8374366212), (-28.680833599, 21.9075006515))
            Line((-28.680833599, 21.9075006515), (-25.505833599, 21.9075006515))
            ThreePointArc((-25.505833599, 21.9075006515), (-23.2607695687, 22.8374366212), (-22.330833599, 25.0825006515))
            Line((-22.330833599, 25.0825006515), (-22.330833599, 28.2575006515))
            ThreePointArc((-22.330833599, 28.2575006515), (-23.2607695687, 30.5025646817), (-25.505833599, 31.4325006515))
        make_face()
        with BuildLine():
            Line((-13.7357695687, 43.2025646817), (-16.9107695687, 43.2025646817))
            ThreePointArc((-16.9107695687, 43.2025646817), (-19.155833599, 42.272628712), (-20.0857695687, 40.0275646817))
            Line((-20.0857695687, 40.0275646817), (-20.0857695687, 36.8525646817))
            ThreePointArc((-20.0857695687, 36.8525646817), (-19.155833599, 34.6075006515), (-16.9107695687, 33.6775646817))
            Line((-16.9107695687, 33.6775646817), (-13.7357695687, 33.6775646817))
            ThreePointArc((-13.7357695687, 33.6775646817), (-11.4907055384, 34.6075006515), (-10.5607695687, 36.8525646817))
            Line((-10.5607695687, 36.8525646817), (-10.5607695687, 40.0275646817))
            ThreePointArc((-10.5607695687, 40.0275646817), (-11.4907055384, 42.272628712), (-13.7357695687, 43.2025646817))
        make_face()
        with BuildLine():
            Line((-1.9657055384, 54.972628712), (-5.1407055384, 54.972628712))
            ThreePointArc((-5.1407055384, 54.972628712), (-7.3857695687, 54.0426927423), (-8.3157055384, 51.797628712))
            Line((-8.3157055384, 51.797628712), (-8.3157055384, 48.622628712))
            ThreePointArc((-8.3157055384, 48.622628712), (-7.3857695687, 46.3775646817), (-5.1407055384, 45.447628712))
            Line((-5.1407055384, 45.447628712), (-1.9657055384, 45.447628712))
            ThreePointArc((-1.9657055384, 45.447628712), (0.2793584918, 46.3775646817), (1.2092944616, 48.622628712))
            Line((1.2092944616, 48.622628712), (1.2092944616, 51.797628712))
            ThreePointArc((1.2092944616, 51.797628712), (0.2793584918, 54.0426927423), (-1.9657055384, 54.972628712))
        make_face()
    extrude(amount=-F2_DEPTH, mode=Mode.SUBTRACT)


solid = f1.part
